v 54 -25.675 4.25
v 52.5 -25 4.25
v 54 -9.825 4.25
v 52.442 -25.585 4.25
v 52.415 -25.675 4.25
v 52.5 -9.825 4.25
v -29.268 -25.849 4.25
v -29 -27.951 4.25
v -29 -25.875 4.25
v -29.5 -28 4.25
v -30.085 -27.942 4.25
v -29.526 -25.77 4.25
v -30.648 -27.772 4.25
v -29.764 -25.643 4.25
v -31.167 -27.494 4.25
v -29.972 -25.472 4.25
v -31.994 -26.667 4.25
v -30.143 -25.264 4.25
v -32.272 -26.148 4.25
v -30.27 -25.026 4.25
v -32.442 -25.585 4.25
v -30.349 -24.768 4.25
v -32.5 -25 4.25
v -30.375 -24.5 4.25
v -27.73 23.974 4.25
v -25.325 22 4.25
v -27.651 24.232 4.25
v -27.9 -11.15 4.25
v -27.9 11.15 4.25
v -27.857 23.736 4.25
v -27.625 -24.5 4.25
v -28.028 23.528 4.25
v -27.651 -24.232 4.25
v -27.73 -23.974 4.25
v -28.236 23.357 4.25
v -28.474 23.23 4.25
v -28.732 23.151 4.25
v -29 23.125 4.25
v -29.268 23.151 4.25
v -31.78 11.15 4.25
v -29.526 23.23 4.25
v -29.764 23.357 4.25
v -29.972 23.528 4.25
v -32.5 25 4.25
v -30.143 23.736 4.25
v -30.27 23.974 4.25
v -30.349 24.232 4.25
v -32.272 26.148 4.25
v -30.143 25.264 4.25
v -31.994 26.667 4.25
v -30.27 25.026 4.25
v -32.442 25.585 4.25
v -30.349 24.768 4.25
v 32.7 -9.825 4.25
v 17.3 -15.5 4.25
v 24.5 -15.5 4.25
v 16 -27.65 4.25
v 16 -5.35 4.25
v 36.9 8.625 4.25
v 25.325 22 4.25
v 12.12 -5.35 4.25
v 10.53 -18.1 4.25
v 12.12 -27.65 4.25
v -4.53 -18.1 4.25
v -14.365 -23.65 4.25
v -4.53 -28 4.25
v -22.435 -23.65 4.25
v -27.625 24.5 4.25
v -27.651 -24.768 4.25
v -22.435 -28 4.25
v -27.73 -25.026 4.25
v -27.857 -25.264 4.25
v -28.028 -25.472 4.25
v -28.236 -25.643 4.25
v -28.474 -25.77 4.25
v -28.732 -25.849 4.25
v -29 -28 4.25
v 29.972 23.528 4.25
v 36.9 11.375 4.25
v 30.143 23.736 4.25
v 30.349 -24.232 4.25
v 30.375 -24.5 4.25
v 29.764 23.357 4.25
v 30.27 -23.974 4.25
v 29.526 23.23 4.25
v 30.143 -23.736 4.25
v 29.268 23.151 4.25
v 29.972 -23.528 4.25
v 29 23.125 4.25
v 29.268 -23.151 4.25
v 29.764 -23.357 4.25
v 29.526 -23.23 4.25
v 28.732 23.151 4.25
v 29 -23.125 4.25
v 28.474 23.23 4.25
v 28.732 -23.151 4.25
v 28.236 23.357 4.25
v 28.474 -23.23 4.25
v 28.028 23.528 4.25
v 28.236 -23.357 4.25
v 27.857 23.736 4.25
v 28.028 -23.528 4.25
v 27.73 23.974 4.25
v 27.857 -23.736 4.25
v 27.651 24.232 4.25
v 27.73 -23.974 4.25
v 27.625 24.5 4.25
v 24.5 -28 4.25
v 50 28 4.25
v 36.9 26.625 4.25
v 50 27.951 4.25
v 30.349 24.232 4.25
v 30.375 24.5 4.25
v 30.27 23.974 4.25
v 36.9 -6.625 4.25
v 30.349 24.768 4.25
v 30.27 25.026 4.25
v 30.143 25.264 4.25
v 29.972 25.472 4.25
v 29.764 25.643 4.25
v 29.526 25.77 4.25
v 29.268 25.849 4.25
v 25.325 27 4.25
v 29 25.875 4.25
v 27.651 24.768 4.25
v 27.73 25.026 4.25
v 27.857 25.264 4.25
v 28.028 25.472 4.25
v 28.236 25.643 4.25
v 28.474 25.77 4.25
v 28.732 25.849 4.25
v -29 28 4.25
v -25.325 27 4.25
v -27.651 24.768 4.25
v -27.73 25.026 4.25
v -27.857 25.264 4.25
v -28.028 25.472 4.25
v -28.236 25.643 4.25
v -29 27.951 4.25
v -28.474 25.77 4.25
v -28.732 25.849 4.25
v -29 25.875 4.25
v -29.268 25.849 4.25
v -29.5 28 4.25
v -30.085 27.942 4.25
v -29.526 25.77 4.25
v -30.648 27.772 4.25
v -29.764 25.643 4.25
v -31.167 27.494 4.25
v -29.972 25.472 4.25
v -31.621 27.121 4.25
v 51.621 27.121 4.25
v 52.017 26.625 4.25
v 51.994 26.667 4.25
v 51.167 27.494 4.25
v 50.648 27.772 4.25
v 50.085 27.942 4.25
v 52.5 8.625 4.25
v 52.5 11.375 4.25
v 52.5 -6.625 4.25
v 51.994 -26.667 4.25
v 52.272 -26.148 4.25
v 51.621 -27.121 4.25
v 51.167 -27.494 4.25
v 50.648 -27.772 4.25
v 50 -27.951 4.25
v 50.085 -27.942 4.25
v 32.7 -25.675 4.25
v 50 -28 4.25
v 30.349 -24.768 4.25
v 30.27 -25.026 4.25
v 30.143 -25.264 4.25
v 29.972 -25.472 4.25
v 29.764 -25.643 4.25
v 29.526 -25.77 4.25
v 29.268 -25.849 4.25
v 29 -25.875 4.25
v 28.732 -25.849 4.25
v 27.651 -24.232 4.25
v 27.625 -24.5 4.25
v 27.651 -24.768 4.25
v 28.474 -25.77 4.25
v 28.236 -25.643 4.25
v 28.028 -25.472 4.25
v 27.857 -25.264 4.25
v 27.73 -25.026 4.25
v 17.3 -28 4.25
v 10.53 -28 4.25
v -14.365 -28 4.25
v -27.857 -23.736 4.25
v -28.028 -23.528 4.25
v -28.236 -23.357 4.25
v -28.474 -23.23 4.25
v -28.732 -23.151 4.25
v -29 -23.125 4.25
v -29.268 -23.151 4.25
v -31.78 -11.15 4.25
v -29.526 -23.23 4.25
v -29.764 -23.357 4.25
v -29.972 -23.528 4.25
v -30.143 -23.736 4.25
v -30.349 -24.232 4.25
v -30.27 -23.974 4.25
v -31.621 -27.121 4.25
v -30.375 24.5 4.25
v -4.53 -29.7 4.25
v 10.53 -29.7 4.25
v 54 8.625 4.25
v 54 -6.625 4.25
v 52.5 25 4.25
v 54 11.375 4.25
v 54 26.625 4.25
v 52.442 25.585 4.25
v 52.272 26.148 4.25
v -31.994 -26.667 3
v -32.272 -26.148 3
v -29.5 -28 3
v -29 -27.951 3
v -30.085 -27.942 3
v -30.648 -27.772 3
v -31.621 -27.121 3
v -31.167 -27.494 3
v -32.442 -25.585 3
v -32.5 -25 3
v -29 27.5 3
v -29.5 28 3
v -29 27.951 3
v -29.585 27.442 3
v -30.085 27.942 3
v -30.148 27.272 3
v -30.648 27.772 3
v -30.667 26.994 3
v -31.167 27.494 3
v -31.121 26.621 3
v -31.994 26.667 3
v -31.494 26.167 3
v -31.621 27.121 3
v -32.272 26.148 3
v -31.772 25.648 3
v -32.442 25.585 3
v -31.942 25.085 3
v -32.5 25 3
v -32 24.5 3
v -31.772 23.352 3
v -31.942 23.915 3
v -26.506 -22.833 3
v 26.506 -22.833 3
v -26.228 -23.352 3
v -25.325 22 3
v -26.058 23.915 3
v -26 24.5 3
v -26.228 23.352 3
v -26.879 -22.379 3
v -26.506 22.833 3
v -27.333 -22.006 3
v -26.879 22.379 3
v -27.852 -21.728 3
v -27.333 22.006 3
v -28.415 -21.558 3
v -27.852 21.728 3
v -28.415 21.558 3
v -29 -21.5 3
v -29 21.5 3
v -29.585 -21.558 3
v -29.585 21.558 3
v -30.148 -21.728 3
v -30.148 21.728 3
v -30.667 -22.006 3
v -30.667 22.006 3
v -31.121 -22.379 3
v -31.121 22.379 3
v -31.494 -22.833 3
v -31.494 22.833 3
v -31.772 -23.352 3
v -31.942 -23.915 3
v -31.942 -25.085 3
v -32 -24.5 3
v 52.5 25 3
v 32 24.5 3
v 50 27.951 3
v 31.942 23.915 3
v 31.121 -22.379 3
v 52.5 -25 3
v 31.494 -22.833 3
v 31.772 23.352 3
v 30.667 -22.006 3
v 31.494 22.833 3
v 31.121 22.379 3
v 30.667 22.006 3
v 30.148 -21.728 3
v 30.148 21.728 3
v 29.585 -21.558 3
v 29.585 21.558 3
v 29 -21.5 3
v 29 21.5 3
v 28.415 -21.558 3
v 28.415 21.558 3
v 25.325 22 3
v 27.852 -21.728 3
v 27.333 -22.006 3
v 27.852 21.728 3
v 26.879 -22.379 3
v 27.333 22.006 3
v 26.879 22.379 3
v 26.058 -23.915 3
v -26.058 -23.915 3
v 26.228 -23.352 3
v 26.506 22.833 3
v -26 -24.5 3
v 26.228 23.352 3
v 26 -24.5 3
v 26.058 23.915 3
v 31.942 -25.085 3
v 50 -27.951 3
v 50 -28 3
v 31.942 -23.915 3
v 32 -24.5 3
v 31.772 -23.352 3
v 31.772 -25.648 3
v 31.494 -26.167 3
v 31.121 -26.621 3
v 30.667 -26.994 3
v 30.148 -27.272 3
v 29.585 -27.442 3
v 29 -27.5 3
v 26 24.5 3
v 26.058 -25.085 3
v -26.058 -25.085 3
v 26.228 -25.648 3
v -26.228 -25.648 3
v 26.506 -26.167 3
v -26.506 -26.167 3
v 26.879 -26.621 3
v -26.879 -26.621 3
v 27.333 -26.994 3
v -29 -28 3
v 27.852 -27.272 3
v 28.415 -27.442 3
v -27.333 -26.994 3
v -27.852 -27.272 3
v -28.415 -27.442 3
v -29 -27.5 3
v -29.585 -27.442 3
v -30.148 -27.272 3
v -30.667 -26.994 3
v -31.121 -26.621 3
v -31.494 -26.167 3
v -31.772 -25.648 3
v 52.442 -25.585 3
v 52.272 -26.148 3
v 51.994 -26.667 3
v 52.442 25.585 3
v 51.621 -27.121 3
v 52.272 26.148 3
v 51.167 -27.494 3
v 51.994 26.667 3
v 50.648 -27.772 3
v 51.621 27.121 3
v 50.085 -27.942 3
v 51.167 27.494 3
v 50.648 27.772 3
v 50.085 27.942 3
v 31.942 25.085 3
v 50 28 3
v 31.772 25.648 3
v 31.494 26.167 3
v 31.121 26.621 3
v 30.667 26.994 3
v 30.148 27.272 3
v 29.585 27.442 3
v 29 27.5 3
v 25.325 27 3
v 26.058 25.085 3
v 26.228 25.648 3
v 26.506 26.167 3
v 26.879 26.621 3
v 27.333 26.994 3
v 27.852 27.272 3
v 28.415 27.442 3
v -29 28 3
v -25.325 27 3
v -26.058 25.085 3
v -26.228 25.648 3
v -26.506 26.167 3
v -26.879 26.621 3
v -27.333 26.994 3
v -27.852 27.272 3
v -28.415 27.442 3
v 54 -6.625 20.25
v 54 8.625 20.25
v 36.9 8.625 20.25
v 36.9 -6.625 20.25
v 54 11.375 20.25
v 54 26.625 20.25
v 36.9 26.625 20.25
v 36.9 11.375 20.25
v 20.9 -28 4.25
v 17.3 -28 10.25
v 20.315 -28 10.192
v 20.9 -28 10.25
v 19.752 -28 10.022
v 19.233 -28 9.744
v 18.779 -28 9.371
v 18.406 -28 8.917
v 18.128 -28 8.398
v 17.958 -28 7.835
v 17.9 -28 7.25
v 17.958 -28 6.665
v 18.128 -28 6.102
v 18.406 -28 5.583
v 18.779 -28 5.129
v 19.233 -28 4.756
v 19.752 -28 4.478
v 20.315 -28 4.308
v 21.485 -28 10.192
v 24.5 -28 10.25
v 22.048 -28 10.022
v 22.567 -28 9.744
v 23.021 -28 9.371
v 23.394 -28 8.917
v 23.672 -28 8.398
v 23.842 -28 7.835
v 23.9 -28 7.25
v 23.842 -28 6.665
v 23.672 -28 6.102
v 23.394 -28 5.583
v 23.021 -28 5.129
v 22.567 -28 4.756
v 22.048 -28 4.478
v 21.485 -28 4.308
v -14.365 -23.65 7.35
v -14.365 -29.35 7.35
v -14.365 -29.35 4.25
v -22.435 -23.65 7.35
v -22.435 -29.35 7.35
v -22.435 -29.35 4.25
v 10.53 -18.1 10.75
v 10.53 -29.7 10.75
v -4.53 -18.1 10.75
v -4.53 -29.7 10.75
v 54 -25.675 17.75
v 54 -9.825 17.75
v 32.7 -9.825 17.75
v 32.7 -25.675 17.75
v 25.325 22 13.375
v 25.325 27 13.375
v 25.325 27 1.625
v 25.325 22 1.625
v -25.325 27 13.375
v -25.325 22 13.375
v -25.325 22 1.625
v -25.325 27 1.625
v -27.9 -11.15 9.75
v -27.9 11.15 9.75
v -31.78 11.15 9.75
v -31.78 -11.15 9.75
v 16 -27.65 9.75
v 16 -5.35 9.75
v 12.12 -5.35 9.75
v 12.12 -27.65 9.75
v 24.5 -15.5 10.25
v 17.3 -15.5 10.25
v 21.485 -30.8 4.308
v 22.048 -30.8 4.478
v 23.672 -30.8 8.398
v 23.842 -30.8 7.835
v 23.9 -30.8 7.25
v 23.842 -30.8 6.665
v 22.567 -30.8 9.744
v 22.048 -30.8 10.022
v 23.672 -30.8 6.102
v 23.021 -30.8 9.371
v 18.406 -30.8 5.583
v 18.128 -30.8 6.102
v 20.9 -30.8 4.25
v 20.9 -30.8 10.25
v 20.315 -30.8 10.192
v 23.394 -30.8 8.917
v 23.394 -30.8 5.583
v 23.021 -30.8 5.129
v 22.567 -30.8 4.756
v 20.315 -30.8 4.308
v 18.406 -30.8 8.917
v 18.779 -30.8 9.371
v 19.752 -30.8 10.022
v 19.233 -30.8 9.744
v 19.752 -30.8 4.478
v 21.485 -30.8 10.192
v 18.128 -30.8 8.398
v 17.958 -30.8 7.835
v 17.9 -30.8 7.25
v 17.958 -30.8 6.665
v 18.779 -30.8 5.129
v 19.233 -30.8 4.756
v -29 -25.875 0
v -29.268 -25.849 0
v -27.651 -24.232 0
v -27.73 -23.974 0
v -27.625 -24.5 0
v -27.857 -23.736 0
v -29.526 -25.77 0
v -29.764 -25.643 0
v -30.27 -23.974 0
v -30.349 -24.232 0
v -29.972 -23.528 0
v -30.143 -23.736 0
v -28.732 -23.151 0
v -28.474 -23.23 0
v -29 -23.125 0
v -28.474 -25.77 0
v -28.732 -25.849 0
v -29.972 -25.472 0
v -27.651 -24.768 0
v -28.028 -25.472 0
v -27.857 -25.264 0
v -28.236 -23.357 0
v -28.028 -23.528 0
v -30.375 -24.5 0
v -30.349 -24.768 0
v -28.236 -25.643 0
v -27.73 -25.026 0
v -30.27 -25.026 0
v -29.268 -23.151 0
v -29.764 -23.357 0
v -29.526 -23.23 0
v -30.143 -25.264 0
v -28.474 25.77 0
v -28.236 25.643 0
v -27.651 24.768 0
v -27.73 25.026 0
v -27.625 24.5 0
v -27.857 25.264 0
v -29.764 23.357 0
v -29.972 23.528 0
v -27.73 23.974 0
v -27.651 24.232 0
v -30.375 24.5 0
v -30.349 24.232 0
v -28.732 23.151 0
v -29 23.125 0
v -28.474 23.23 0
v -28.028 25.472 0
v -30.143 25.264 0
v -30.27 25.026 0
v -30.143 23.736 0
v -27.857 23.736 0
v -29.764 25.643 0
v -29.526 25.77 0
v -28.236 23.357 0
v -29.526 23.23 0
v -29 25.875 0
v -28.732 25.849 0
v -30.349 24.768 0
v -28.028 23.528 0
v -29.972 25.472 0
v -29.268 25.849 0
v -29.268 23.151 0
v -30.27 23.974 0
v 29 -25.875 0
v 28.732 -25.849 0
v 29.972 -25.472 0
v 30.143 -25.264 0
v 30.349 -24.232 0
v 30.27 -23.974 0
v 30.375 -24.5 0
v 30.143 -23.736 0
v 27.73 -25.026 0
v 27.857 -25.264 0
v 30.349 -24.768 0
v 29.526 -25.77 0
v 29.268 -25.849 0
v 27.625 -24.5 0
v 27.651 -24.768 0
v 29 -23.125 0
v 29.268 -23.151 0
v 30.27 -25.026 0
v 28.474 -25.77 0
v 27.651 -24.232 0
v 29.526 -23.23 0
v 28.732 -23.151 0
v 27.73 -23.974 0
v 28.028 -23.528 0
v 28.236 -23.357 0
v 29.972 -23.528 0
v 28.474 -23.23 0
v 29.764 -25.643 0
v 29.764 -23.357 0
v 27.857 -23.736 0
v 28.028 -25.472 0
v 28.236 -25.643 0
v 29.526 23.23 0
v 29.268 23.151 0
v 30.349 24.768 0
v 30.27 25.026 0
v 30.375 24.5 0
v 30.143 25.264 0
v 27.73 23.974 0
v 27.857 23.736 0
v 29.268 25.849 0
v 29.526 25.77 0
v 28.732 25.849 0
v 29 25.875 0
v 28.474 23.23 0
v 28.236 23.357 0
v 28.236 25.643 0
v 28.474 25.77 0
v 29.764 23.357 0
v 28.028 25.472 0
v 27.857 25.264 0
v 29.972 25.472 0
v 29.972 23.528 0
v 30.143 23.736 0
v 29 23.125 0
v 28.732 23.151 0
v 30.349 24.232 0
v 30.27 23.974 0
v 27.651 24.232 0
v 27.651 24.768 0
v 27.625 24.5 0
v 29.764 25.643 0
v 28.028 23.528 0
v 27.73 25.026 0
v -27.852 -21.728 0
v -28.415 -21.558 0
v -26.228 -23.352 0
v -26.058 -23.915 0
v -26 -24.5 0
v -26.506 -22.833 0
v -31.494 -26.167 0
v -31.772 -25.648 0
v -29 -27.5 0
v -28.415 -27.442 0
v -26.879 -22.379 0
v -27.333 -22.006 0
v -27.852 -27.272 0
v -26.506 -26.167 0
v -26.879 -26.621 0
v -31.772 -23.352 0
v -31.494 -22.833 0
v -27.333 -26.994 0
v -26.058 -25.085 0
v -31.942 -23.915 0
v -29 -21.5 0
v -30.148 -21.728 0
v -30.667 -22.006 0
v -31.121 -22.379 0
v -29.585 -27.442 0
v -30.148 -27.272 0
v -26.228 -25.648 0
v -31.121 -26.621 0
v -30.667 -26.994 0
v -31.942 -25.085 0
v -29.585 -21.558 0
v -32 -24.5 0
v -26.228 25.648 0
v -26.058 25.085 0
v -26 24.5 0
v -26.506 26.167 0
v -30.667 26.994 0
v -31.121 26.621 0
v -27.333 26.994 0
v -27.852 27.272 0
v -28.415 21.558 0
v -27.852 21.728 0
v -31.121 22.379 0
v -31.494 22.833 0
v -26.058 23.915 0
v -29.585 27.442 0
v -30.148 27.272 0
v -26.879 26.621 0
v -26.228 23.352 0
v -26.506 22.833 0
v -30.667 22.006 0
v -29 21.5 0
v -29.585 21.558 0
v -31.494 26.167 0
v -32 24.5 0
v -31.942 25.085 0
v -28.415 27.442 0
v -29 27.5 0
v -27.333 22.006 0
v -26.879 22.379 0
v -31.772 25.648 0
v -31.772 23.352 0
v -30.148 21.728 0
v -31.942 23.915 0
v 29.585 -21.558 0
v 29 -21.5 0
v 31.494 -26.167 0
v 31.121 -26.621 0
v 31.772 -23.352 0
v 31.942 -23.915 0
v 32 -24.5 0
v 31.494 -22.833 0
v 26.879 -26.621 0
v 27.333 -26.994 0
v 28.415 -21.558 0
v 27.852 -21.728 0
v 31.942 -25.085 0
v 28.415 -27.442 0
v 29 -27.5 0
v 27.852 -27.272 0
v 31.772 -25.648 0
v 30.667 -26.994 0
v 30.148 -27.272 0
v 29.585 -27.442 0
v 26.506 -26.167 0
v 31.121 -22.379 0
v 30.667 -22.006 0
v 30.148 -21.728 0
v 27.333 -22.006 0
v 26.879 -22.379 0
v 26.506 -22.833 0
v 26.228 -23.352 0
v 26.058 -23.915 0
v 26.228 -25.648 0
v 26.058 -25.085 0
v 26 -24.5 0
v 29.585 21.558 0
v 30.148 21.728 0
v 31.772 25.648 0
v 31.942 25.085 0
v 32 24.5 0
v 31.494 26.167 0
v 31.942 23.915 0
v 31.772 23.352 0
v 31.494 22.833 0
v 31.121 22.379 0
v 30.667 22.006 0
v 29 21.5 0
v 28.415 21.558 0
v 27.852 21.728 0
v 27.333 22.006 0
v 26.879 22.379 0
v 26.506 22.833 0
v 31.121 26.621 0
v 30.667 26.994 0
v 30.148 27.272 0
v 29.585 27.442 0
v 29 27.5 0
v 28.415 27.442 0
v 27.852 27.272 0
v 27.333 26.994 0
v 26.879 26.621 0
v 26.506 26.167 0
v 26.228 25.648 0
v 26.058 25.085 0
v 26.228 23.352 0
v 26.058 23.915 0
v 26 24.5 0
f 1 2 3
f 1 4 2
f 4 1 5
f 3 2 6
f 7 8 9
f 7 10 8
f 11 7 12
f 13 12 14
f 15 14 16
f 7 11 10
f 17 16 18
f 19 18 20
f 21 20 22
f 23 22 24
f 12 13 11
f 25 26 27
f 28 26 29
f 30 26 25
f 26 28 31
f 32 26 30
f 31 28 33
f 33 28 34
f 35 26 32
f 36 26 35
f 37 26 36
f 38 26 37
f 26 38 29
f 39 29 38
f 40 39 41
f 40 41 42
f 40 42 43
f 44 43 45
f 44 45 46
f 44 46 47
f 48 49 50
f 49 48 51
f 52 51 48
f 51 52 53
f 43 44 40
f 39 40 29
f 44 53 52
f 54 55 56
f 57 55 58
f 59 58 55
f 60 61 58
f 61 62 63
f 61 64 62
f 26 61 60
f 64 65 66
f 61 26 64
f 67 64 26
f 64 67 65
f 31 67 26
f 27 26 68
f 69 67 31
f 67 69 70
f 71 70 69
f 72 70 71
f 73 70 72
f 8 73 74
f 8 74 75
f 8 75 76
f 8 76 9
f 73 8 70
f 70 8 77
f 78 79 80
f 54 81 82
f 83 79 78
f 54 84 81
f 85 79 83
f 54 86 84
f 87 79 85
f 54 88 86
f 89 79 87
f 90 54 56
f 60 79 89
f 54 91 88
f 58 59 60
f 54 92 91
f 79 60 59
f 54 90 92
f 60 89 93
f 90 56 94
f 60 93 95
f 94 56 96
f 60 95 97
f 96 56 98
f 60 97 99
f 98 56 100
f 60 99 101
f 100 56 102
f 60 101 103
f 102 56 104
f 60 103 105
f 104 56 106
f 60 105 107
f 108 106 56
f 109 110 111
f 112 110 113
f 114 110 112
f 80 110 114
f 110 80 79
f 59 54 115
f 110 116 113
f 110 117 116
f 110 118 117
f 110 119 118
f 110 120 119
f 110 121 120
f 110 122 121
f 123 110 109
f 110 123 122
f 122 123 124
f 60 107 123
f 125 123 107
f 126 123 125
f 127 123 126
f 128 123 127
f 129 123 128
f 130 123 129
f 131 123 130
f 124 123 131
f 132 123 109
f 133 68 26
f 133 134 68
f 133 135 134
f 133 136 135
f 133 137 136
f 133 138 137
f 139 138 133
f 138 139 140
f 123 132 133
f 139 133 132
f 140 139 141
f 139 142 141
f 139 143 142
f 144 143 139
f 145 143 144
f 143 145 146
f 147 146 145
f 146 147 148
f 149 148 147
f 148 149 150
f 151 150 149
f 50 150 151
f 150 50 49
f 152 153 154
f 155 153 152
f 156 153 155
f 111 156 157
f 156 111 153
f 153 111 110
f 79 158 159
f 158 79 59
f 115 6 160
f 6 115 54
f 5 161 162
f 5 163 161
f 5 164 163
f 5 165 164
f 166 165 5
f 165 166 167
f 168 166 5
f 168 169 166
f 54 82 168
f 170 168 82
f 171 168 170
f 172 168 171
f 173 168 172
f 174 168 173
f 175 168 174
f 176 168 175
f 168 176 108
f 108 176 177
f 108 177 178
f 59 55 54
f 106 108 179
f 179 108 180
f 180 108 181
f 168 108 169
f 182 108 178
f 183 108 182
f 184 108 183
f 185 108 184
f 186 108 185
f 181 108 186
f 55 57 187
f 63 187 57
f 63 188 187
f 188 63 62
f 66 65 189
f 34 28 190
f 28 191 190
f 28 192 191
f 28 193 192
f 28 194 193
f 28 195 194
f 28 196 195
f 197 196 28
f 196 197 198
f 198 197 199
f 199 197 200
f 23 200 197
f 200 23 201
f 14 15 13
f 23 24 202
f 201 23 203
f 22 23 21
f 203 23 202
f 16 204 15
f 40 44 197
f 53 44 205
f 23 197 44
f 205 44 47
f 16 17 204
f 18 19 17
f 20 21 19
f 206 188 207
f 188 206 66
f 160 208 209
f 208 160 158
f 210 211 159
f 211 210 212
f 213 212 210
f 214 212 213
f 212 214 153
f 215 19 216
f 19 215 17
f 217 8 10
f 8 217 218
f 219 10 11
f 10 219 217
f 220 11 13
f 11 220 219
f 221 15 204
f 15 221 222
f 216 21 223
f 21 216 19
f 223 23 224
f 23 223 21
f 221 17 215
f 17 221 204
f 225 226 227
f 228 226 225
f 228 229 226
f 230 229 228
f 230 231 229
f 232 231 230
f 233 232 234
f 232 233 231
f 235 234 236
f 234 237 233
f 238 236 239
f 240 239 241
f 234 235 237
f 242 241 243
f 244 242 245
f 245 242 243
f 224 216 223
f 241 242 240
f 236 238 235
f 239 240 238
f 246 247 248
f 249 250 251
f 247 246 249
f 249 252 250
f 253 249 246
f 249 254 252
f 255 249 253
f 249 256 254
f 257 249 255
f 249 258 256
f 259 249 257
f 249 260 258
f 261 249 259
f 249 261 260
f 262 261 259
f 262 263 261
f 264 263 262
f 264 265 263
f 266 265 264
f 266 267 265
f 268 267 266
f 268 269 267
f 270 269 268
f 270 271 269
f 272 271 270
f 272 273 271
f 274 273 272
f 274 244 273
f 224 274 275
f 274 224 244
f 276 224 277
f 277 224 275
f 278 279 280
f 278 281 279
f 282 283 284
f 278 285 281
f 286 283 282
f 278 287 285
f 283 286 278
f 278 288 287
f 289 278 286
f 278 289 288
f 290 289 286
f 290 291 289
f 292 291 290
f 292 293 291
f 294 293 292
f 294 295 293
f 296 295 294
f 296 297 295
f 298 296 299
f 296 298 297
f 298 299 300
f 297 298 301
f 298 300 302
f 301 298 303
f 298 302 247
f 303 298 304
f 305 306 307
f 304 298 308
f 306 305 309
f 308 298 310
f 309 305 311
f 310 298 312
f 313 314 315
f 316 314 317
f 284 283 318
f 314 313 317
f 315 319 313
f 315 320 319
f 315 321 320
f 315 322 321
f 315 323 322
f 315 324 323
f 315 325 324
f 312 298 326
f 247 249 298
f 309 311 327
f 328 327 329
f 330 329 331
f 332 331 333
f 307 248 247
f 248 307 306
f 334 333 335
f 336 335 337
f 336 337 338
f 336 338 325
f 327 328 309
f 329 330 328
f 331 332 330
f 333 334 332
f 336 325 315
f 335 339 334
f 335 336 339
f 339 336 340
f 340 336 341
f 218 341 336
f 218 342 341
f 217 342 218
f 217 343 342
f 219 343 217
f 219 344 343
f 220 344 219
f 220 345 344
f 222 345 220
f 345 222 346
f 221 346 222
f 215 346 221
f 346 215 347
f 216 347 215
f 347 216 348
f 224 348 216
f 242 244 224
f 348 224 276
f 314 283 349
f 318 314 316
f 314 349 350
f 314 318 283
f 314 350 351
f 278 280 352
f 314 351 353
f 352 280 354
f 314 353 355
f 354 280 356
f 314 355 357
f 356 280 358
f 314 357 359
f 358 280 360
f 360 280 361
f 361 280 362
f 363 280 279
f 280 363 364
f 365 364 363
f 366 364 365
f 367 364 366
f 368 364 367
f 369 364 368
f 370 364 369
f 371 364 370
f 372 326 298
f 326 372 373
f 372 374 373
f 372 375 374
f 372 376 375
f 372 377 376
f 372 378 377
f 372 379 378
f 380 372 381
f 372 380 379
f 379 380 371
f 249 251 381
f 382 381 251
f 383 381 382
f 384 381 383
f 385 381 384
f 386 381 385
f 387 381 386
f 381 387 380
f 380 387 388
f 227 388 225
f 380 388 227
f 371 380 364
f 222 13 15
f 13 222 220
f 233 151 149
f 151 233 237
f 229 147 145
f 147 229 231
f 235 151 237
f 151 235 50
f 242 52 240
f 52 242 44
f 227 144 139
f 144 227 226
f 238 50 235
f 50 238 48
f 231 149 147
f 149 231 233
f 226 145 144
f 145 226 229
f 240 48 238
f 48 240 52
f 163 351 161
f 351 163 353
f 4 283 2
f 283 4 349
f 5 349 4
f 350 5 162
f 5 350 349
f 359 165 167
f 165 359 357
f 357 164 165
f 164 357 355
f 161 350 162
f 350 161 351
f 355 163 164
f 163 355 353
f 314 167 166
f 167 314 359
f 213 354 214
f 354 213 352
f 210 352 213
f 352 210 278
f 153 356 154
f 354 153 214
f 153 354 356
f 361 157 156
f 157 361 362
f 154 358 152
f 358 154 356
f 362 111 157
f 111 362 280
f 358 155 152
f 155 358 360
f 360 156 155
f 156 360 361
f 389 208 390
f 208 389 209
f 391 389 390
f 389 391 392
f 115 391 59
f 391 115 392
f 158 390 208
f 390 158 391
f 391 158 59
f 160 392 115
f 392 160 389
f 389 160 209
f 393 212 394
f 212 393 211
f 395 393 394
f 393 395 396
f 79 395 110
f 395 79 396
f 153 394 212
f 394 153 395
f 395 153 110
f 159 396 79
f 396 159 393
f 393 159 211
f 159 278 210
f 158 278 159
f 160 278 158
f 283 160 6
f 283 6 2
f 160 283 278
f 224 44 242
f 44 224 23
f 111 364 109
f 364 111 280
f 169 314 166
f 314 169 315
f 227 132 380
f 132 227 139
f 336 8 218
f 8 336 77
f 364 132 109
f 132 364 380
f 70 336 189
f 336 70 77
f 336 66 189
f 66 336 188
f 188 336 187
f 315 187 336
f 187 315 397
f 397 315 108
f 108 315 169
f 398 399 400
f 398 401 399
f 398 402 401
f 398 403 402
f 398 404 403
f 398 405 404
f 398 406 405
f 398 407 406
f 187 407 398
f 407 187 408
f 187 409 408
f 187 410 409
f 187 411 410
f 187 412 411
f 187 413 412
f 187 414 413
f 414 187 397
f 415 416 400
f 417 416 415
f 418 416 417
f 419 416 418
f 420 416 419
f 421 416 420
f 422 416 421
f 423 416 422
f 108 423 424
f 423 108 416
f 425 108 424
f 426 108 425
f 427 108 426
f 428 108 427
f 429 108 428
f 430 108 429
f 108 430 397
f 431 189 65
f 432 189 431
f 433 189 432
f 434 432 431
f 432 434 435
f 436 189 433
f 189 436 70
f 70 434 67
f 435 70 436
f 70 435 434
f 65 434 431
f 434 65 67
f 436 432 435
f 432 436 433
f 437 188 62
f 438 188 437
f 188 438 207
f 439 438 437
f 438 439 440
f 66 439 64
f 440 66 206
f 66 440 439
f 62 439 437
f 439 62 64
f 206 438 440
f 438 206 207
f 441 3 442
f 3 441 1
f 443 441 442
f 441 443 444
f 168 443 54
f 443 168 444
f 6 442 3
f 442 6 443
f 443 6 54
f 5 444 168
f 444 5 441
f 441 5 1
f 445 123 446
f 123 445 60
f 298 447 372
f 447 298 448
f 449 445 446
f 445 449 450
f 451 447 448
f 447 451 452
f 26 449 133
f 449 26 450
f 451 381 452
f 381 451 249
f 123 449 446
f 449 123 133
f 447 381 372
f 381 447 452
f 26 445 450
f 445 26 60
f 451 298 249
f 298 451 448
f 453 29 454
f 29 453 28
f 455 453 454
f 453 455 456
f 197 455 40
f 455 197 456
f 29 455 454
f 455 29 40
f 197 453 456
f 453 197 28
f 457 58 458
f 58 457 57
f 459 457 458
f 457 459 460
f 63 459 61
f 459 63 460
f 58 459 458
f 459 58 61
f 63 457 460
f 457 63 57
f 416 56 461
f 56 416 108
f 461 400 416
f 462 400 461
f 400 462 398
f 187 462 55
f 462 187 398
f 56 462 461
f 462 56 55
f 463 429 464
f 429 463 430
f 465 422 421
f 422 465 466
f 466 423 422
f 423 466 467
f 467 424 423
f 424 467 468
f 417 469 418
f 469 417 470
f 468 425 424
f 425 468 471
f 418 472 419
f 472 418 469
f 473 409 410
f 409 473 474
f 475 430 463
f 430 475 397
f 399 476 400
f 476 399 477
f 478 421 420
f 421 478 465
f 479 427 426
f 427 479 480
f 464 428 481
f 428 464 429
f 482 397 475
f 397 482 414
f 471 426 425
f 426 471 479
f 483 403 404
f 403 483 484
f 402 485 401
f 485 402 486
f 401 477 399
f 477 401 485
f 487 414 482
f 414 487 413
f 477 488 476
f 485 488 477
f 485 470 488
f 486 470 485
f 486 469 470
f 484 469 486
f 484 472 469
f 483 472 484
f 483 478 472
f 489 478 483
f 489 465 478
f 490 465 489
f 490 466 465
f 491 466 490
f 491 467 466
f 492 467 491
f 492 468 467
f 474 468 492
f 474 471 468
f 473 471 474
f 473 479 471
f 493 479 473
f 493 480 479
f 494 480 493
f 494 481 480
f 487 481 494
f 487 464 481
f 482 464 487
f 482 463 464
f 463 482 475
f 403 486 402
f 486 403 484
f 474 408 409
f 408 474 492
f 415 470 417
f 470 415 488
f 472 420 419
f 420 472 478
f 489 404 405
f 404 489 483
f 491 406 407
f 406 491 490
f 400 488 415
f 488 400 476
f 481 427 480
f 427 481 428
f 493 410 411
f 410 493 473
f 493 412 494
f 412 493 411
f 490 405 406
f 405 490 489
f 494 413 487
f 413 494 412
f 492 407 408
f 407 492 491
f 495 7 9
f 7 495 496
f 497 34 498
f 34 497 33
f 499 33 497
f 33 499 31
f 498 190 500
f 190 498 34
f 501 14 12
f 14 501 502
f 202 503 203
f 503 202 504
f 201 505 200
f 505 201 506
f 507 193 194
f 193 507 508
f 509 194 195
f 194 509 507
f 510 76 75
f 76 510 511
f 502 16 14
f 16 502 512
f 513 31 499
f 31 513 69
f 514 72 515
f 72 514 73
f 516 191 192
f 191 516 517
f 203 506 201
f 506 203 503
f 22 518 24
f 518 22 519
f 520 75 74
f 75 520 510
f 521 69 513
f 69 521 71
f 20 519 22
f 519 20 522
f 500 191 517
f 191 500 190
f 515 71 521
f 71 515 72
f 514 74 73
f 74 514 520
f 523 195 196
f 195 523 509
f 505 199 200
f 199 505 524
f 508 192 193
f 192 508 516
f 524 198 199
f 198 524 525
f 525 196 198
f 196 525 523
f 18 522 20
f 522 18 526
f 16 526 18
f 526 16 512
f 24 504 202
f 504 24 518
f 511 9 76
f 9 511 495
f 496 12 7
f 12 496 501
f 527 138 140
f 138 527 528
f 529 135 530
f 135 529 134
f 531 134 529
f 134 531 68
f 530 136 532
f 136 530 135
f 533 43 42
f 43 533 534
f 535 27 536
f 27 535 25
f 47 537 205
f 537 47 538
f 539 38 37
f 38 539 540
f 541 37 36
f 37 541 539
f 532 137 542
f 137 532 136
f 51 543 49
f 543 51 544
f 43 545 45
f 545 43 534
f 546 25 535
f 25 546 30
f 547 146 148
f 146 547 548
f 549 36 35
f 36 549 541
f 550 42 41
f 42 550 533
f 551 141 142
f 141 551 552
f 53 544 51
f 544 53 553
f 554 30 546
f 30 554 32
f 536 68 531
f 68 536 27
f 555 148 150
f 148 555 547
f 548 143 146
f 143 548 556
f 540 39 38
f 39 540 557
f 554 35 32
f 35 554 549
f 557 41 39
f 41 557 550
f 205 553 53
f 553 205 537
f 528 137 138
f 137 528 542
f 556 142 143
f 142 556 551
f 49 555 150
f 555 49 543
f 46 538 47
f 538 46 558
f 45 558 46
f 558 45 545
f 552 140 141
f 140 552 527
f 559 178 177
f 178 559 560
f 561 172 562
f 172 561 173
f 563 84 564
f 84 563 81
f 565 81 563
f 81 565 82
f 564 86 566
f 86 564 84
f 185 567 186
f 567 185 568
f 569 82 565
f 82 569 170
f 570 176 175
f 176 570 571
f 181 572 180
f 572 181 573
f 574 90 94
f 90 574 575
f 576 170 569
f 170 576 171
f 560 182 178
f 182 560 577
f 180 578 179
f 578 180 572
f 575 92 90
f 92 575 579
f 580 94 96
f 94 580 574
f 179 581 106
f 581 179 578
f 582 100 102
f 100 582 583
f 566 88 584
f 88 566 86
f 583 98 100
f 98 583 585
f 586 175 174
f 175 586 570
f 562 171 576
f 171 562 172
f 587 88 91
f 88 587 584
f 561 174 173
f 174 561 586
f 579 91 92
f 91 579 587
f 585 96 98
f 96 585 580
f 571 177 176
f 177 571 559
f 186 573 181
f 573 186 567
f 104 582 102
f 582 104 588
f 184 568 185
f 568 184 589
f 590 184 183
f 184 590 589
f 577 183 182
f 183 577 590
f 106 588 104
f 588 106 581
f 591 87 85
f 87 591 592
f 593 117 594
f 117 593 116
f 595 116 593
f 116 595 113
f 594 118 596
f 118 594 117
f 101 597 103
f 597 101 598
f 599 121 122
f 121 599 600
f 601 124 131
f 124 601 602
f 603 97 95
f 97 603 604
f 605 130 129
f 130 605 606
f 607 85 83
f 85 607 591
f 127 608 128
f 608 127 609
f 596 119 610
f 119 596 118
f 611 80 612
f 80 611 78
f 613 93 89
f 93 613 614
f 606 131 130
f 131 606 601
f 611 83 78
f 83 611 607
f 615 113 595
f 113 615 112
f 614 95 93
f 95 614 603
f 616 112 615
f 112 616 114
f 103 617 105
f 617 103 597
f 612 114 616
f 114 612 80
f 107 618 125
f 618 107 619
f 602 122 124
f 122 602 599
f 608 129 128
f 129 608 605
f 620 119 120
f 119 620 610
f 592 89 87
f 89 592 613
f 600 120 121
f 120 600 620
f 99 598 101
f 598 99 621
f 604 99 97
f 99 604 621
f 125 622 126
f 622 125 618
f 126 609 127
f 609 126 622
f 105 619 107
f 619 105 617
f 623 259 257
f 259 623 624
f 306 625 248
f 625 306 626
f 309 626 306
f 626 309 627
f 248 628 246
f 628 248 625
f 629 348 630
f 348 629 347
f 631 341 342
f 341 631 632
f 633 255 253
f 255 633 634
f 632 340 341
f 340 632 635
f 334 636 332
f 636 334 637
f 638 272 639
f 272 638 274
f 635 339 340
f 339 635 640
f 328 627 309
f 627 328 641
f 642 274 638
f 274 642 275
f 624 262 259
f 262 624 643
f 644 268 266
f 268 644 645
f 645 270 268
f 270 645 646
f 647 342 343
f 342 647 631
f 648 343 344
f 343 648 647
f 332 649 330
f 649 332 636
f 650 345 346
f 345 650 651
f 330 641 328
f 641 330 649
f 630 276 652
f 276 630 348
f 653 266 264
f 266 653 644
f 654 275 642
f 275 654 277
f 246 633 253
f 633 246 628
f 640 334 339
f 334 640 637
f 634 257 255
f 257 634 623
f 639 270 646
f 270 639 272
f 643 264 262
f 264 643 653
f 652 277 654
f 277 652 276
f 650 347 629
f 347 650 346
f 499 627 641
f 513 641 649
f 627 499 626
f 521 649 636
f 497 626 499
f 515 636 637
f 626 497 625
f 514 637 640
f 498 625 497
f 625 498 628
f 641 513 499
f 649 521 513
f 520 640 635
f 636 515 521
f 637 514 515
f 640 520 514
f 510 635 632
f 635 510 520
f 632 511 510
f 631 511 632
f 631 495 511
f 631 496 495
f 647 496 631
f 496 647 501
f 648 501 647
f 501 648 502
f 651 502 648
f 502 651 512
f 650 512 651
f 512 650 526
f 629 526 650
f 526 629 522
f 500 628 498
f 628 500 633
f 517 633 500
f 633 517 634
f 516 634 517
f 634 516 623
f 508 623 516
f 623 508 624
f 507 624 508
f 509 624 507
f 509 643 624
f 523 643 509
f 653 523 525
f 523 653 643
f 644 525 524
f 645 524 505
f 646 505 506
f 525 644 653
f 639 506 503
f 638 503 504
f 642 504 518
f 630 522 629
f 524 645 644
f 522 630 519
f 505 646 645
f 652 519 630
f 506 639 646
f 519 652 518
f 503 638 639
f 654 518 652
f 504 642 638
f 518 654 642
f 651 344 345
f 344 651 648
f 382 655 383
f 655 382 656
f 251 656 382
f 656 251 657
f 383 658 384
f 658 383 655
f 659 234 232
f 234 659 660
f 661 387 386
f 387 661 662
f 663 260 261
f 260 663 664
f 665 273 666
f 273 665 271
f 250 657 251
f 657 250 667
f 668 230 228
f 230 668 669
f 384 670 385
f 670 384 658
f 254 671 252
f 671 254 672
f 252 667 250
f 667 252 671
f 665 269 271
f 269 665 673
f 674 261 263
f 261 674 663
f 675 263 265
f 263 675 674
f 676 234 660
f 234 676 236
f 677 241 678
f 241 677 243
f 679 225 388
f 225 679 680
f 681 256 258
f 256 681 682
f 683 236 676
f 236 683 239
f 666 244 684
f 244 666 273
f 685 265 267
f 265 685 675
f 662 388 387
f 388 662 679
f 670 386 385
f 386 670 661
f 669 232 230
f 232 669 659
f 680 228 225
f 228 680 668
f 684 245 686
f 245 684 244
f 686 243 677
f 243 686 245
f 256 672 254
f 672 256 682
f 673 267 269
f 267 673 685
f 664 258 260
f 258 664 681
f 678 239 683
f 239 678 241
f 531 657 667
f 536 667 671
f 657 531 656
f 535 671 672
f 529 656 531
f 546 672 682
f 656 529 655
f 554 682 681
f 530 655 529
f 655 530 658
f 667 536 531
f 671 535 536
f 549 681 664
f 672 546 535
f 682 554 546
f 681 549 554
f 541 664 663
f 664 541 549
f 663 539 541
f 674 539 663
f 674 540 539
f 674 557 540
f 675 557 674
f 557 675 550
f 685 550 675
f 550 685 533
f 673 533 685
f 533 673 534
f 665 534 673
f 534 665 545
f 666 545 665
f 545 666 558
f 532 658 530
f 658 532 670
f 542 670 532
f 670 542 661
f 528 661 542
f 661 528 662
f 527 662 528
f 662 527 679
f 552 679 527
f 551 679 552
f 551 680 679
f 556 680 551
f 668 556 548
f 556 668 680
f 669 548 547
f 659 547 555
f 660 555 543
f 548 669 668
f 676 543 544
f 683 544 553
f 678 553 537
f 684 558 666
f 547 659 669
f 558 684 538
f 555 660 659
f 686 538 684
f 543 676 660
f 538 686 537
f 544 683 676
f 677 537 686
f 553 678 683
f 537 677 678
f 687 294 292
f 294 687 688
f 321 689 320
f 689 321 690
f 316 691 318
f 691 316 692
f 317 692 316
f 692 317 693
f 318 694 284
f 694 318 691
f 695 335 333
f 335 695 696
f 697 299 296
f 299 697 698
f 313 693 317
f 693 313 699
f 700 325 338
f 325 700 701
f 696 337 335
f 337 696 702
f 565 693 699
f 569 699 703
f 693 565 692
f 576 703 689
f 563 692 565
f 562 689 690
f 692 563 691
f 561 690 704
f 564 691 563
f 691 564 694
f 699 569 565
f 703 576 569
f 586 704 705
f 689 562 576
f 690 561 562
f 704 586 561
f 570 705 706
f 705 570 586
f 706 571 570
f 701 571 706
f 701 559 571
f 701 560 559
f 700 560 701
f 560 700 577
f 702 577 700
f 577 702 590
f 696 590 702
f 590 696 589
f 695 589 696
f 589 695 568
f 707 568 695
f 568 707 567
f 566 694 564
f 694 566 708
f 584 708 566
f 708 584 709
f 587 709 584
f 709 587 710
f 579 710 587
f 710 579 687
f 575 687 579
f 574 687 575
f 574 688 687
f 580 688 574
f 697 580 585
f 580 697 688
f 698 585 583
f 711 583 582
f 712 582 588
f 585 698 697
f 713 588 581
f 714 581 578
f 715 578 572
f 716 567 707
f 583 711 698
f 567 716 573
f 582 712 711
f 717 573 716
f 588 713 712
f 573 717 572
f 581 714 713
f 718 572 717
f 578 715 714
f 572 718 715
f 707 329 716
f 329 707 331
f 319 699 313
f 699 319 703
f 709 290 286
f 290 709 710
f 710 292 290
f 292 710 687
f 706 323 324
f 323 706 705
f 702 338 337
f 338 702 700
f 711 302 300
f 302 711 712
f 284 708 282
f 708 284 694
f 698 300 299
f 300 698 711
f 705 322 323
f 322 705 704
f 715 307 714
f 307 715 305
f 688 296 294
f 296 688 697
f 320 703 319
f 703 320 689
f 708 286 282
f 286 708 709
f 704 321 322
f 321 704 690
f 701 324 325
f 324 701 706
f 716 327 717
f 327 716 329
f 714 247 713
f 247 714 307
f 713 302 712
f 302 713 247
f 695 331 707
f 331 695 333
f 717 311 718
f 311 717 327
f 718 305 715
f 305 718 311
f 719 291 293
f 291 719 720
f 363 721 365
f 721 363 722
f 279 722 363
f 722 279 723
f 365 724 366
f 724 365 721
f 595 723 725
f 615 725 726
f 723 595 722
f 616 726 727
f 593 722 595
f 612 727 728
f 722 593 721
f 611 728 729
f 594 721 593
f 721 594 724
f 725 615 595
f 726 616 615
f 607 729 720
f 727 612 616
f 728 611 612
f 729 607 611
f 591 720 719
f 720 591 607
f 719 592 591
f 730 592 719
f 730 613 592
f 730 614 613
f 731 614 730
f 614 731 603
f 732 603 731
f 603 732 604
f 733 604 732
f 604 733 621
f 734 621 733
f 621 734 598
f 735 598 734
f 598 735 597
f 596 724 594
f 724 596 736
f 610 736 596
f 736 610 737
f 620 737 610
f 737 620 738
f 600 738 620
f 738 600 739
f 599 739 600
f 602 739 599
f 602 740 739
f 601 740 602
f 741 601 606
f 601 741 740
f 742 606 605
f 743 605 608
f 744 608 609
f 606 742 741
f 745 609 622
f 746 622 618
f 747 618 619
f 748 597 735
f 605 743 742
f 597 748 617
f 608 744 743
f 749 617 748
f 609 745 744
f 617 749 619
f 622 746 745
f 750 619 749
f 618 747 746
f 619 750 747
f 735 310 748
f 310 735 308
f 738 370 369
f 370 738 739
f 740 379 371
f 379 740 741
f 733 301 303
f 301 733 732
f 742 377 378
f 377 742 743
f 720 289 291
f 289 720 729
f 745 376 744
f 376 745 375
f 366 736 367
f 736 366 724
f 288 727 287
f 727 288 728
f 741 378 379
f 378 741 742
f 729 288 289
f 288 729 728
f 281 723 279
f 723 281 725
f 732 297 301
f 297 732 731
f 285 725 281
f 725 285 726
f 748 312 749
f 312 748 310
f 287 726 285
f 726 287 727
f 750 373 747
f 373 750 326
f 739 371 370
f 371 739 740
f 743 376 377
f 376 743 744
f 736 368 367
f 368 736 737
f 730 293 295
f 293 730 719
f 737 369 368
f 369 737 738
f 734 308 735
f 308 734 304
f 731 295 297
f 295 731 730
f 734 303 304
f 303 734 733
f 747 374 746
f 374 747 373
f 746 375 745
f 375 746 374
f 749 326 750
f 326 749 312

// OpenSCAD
module raspi3() {
    ph = 1.25;
    mxh = 2;
    hdx = 58;
    hdy = 49;
    cr = 3;
    be = -58/2;
    difference() {
        union() {
            for(x=[-1, 1]) {
                for(y=[-1, 1]) {
                    translate([x*(85/2-cr)+27/2-3.5, y*(56/2-cr), 0]) cylinder(r=cr, h=ph, $fn=32);
                }
            }
            translate([be-3.5, -56/2+cr, 0]) cube([85, 56-2*cr, ph]);
            translate([be, -56/2, 0]) cube([85-2*cr, 56, ph]);
            // micro USB power
            translate([be+10.6, -56/2-(57.35-56)+5.7/2, ph+3.1/2]) cube([8.07, 5.7, 3.1], center=true);
            // HDMI socket
            translate([be+32, -56/2-(57.7-56)+11.6/2, ph+6.5/2]) cube([15.06, 11.6, 6.5], center=true);
            // ethernet
            translate([be+85-2-21.3/2, -56/2+10.25, ph+13.5/2]) cube([21.3, 15.85, 13.5], center=true);
            // usb
            for(i=[29, 47]) {
                translate([be+85-2-17.1/2, -56/2+i, ph+16/2]) cube([17.1, 15.25, 16], center=true);
            }
            // pin header
            translate([be+29, 49/2, ph+8.5/2-mxh/2]) cube([50.65, 5, 8.5+ph+mxh], center=true);
            // display connector
            translate([be+1.1-3.88/2, 0, ph+5.5/2]) cube([3.88, 22.3, 5.5], center=true);
            // camera connector
            translate([be+32+13-3.88/2, -56/2+11.5, ph+5.5/2]) cube([3.88, 22.3, 5.5], center=true);
            // headphone jack
            translate([be+53.5-7.2/2, -56/2+12.5/2, ph+6/2]) cube([7.2, 12.5, 6], center=true);
            translate([be+53.5-7.2/2, -56/2, ph+6/2]) rotate([90, 0, 0]) cylinder(d=6, h=2.8, $fn=32);
        }
        for(x=[-hdx/2, hdx/2]) {
            for(y=[-hdy/2, hdy/2]) {
                translate([x, y, -1]) cylinder(d=2.75, h=ph+2, $fn=32);
            }
        }
    }
}
translate([0, 0, 3]) color("blue") raspi3();

module rpiMount(h) {
    dx = 58;
    dy = 49;
    for(x=[-dx/2, dx/2]) {
        for(y=[-dy/2, dy/2]) {
            difference() {
                translate([x, y, 0]) cylinder(d=6, h=h, $fn=32);
                translate([x, y, -1]) cylinder(d=2.75, h=h+2, $fn=32);
            }
        }
    }
}
rpiMount(3);
